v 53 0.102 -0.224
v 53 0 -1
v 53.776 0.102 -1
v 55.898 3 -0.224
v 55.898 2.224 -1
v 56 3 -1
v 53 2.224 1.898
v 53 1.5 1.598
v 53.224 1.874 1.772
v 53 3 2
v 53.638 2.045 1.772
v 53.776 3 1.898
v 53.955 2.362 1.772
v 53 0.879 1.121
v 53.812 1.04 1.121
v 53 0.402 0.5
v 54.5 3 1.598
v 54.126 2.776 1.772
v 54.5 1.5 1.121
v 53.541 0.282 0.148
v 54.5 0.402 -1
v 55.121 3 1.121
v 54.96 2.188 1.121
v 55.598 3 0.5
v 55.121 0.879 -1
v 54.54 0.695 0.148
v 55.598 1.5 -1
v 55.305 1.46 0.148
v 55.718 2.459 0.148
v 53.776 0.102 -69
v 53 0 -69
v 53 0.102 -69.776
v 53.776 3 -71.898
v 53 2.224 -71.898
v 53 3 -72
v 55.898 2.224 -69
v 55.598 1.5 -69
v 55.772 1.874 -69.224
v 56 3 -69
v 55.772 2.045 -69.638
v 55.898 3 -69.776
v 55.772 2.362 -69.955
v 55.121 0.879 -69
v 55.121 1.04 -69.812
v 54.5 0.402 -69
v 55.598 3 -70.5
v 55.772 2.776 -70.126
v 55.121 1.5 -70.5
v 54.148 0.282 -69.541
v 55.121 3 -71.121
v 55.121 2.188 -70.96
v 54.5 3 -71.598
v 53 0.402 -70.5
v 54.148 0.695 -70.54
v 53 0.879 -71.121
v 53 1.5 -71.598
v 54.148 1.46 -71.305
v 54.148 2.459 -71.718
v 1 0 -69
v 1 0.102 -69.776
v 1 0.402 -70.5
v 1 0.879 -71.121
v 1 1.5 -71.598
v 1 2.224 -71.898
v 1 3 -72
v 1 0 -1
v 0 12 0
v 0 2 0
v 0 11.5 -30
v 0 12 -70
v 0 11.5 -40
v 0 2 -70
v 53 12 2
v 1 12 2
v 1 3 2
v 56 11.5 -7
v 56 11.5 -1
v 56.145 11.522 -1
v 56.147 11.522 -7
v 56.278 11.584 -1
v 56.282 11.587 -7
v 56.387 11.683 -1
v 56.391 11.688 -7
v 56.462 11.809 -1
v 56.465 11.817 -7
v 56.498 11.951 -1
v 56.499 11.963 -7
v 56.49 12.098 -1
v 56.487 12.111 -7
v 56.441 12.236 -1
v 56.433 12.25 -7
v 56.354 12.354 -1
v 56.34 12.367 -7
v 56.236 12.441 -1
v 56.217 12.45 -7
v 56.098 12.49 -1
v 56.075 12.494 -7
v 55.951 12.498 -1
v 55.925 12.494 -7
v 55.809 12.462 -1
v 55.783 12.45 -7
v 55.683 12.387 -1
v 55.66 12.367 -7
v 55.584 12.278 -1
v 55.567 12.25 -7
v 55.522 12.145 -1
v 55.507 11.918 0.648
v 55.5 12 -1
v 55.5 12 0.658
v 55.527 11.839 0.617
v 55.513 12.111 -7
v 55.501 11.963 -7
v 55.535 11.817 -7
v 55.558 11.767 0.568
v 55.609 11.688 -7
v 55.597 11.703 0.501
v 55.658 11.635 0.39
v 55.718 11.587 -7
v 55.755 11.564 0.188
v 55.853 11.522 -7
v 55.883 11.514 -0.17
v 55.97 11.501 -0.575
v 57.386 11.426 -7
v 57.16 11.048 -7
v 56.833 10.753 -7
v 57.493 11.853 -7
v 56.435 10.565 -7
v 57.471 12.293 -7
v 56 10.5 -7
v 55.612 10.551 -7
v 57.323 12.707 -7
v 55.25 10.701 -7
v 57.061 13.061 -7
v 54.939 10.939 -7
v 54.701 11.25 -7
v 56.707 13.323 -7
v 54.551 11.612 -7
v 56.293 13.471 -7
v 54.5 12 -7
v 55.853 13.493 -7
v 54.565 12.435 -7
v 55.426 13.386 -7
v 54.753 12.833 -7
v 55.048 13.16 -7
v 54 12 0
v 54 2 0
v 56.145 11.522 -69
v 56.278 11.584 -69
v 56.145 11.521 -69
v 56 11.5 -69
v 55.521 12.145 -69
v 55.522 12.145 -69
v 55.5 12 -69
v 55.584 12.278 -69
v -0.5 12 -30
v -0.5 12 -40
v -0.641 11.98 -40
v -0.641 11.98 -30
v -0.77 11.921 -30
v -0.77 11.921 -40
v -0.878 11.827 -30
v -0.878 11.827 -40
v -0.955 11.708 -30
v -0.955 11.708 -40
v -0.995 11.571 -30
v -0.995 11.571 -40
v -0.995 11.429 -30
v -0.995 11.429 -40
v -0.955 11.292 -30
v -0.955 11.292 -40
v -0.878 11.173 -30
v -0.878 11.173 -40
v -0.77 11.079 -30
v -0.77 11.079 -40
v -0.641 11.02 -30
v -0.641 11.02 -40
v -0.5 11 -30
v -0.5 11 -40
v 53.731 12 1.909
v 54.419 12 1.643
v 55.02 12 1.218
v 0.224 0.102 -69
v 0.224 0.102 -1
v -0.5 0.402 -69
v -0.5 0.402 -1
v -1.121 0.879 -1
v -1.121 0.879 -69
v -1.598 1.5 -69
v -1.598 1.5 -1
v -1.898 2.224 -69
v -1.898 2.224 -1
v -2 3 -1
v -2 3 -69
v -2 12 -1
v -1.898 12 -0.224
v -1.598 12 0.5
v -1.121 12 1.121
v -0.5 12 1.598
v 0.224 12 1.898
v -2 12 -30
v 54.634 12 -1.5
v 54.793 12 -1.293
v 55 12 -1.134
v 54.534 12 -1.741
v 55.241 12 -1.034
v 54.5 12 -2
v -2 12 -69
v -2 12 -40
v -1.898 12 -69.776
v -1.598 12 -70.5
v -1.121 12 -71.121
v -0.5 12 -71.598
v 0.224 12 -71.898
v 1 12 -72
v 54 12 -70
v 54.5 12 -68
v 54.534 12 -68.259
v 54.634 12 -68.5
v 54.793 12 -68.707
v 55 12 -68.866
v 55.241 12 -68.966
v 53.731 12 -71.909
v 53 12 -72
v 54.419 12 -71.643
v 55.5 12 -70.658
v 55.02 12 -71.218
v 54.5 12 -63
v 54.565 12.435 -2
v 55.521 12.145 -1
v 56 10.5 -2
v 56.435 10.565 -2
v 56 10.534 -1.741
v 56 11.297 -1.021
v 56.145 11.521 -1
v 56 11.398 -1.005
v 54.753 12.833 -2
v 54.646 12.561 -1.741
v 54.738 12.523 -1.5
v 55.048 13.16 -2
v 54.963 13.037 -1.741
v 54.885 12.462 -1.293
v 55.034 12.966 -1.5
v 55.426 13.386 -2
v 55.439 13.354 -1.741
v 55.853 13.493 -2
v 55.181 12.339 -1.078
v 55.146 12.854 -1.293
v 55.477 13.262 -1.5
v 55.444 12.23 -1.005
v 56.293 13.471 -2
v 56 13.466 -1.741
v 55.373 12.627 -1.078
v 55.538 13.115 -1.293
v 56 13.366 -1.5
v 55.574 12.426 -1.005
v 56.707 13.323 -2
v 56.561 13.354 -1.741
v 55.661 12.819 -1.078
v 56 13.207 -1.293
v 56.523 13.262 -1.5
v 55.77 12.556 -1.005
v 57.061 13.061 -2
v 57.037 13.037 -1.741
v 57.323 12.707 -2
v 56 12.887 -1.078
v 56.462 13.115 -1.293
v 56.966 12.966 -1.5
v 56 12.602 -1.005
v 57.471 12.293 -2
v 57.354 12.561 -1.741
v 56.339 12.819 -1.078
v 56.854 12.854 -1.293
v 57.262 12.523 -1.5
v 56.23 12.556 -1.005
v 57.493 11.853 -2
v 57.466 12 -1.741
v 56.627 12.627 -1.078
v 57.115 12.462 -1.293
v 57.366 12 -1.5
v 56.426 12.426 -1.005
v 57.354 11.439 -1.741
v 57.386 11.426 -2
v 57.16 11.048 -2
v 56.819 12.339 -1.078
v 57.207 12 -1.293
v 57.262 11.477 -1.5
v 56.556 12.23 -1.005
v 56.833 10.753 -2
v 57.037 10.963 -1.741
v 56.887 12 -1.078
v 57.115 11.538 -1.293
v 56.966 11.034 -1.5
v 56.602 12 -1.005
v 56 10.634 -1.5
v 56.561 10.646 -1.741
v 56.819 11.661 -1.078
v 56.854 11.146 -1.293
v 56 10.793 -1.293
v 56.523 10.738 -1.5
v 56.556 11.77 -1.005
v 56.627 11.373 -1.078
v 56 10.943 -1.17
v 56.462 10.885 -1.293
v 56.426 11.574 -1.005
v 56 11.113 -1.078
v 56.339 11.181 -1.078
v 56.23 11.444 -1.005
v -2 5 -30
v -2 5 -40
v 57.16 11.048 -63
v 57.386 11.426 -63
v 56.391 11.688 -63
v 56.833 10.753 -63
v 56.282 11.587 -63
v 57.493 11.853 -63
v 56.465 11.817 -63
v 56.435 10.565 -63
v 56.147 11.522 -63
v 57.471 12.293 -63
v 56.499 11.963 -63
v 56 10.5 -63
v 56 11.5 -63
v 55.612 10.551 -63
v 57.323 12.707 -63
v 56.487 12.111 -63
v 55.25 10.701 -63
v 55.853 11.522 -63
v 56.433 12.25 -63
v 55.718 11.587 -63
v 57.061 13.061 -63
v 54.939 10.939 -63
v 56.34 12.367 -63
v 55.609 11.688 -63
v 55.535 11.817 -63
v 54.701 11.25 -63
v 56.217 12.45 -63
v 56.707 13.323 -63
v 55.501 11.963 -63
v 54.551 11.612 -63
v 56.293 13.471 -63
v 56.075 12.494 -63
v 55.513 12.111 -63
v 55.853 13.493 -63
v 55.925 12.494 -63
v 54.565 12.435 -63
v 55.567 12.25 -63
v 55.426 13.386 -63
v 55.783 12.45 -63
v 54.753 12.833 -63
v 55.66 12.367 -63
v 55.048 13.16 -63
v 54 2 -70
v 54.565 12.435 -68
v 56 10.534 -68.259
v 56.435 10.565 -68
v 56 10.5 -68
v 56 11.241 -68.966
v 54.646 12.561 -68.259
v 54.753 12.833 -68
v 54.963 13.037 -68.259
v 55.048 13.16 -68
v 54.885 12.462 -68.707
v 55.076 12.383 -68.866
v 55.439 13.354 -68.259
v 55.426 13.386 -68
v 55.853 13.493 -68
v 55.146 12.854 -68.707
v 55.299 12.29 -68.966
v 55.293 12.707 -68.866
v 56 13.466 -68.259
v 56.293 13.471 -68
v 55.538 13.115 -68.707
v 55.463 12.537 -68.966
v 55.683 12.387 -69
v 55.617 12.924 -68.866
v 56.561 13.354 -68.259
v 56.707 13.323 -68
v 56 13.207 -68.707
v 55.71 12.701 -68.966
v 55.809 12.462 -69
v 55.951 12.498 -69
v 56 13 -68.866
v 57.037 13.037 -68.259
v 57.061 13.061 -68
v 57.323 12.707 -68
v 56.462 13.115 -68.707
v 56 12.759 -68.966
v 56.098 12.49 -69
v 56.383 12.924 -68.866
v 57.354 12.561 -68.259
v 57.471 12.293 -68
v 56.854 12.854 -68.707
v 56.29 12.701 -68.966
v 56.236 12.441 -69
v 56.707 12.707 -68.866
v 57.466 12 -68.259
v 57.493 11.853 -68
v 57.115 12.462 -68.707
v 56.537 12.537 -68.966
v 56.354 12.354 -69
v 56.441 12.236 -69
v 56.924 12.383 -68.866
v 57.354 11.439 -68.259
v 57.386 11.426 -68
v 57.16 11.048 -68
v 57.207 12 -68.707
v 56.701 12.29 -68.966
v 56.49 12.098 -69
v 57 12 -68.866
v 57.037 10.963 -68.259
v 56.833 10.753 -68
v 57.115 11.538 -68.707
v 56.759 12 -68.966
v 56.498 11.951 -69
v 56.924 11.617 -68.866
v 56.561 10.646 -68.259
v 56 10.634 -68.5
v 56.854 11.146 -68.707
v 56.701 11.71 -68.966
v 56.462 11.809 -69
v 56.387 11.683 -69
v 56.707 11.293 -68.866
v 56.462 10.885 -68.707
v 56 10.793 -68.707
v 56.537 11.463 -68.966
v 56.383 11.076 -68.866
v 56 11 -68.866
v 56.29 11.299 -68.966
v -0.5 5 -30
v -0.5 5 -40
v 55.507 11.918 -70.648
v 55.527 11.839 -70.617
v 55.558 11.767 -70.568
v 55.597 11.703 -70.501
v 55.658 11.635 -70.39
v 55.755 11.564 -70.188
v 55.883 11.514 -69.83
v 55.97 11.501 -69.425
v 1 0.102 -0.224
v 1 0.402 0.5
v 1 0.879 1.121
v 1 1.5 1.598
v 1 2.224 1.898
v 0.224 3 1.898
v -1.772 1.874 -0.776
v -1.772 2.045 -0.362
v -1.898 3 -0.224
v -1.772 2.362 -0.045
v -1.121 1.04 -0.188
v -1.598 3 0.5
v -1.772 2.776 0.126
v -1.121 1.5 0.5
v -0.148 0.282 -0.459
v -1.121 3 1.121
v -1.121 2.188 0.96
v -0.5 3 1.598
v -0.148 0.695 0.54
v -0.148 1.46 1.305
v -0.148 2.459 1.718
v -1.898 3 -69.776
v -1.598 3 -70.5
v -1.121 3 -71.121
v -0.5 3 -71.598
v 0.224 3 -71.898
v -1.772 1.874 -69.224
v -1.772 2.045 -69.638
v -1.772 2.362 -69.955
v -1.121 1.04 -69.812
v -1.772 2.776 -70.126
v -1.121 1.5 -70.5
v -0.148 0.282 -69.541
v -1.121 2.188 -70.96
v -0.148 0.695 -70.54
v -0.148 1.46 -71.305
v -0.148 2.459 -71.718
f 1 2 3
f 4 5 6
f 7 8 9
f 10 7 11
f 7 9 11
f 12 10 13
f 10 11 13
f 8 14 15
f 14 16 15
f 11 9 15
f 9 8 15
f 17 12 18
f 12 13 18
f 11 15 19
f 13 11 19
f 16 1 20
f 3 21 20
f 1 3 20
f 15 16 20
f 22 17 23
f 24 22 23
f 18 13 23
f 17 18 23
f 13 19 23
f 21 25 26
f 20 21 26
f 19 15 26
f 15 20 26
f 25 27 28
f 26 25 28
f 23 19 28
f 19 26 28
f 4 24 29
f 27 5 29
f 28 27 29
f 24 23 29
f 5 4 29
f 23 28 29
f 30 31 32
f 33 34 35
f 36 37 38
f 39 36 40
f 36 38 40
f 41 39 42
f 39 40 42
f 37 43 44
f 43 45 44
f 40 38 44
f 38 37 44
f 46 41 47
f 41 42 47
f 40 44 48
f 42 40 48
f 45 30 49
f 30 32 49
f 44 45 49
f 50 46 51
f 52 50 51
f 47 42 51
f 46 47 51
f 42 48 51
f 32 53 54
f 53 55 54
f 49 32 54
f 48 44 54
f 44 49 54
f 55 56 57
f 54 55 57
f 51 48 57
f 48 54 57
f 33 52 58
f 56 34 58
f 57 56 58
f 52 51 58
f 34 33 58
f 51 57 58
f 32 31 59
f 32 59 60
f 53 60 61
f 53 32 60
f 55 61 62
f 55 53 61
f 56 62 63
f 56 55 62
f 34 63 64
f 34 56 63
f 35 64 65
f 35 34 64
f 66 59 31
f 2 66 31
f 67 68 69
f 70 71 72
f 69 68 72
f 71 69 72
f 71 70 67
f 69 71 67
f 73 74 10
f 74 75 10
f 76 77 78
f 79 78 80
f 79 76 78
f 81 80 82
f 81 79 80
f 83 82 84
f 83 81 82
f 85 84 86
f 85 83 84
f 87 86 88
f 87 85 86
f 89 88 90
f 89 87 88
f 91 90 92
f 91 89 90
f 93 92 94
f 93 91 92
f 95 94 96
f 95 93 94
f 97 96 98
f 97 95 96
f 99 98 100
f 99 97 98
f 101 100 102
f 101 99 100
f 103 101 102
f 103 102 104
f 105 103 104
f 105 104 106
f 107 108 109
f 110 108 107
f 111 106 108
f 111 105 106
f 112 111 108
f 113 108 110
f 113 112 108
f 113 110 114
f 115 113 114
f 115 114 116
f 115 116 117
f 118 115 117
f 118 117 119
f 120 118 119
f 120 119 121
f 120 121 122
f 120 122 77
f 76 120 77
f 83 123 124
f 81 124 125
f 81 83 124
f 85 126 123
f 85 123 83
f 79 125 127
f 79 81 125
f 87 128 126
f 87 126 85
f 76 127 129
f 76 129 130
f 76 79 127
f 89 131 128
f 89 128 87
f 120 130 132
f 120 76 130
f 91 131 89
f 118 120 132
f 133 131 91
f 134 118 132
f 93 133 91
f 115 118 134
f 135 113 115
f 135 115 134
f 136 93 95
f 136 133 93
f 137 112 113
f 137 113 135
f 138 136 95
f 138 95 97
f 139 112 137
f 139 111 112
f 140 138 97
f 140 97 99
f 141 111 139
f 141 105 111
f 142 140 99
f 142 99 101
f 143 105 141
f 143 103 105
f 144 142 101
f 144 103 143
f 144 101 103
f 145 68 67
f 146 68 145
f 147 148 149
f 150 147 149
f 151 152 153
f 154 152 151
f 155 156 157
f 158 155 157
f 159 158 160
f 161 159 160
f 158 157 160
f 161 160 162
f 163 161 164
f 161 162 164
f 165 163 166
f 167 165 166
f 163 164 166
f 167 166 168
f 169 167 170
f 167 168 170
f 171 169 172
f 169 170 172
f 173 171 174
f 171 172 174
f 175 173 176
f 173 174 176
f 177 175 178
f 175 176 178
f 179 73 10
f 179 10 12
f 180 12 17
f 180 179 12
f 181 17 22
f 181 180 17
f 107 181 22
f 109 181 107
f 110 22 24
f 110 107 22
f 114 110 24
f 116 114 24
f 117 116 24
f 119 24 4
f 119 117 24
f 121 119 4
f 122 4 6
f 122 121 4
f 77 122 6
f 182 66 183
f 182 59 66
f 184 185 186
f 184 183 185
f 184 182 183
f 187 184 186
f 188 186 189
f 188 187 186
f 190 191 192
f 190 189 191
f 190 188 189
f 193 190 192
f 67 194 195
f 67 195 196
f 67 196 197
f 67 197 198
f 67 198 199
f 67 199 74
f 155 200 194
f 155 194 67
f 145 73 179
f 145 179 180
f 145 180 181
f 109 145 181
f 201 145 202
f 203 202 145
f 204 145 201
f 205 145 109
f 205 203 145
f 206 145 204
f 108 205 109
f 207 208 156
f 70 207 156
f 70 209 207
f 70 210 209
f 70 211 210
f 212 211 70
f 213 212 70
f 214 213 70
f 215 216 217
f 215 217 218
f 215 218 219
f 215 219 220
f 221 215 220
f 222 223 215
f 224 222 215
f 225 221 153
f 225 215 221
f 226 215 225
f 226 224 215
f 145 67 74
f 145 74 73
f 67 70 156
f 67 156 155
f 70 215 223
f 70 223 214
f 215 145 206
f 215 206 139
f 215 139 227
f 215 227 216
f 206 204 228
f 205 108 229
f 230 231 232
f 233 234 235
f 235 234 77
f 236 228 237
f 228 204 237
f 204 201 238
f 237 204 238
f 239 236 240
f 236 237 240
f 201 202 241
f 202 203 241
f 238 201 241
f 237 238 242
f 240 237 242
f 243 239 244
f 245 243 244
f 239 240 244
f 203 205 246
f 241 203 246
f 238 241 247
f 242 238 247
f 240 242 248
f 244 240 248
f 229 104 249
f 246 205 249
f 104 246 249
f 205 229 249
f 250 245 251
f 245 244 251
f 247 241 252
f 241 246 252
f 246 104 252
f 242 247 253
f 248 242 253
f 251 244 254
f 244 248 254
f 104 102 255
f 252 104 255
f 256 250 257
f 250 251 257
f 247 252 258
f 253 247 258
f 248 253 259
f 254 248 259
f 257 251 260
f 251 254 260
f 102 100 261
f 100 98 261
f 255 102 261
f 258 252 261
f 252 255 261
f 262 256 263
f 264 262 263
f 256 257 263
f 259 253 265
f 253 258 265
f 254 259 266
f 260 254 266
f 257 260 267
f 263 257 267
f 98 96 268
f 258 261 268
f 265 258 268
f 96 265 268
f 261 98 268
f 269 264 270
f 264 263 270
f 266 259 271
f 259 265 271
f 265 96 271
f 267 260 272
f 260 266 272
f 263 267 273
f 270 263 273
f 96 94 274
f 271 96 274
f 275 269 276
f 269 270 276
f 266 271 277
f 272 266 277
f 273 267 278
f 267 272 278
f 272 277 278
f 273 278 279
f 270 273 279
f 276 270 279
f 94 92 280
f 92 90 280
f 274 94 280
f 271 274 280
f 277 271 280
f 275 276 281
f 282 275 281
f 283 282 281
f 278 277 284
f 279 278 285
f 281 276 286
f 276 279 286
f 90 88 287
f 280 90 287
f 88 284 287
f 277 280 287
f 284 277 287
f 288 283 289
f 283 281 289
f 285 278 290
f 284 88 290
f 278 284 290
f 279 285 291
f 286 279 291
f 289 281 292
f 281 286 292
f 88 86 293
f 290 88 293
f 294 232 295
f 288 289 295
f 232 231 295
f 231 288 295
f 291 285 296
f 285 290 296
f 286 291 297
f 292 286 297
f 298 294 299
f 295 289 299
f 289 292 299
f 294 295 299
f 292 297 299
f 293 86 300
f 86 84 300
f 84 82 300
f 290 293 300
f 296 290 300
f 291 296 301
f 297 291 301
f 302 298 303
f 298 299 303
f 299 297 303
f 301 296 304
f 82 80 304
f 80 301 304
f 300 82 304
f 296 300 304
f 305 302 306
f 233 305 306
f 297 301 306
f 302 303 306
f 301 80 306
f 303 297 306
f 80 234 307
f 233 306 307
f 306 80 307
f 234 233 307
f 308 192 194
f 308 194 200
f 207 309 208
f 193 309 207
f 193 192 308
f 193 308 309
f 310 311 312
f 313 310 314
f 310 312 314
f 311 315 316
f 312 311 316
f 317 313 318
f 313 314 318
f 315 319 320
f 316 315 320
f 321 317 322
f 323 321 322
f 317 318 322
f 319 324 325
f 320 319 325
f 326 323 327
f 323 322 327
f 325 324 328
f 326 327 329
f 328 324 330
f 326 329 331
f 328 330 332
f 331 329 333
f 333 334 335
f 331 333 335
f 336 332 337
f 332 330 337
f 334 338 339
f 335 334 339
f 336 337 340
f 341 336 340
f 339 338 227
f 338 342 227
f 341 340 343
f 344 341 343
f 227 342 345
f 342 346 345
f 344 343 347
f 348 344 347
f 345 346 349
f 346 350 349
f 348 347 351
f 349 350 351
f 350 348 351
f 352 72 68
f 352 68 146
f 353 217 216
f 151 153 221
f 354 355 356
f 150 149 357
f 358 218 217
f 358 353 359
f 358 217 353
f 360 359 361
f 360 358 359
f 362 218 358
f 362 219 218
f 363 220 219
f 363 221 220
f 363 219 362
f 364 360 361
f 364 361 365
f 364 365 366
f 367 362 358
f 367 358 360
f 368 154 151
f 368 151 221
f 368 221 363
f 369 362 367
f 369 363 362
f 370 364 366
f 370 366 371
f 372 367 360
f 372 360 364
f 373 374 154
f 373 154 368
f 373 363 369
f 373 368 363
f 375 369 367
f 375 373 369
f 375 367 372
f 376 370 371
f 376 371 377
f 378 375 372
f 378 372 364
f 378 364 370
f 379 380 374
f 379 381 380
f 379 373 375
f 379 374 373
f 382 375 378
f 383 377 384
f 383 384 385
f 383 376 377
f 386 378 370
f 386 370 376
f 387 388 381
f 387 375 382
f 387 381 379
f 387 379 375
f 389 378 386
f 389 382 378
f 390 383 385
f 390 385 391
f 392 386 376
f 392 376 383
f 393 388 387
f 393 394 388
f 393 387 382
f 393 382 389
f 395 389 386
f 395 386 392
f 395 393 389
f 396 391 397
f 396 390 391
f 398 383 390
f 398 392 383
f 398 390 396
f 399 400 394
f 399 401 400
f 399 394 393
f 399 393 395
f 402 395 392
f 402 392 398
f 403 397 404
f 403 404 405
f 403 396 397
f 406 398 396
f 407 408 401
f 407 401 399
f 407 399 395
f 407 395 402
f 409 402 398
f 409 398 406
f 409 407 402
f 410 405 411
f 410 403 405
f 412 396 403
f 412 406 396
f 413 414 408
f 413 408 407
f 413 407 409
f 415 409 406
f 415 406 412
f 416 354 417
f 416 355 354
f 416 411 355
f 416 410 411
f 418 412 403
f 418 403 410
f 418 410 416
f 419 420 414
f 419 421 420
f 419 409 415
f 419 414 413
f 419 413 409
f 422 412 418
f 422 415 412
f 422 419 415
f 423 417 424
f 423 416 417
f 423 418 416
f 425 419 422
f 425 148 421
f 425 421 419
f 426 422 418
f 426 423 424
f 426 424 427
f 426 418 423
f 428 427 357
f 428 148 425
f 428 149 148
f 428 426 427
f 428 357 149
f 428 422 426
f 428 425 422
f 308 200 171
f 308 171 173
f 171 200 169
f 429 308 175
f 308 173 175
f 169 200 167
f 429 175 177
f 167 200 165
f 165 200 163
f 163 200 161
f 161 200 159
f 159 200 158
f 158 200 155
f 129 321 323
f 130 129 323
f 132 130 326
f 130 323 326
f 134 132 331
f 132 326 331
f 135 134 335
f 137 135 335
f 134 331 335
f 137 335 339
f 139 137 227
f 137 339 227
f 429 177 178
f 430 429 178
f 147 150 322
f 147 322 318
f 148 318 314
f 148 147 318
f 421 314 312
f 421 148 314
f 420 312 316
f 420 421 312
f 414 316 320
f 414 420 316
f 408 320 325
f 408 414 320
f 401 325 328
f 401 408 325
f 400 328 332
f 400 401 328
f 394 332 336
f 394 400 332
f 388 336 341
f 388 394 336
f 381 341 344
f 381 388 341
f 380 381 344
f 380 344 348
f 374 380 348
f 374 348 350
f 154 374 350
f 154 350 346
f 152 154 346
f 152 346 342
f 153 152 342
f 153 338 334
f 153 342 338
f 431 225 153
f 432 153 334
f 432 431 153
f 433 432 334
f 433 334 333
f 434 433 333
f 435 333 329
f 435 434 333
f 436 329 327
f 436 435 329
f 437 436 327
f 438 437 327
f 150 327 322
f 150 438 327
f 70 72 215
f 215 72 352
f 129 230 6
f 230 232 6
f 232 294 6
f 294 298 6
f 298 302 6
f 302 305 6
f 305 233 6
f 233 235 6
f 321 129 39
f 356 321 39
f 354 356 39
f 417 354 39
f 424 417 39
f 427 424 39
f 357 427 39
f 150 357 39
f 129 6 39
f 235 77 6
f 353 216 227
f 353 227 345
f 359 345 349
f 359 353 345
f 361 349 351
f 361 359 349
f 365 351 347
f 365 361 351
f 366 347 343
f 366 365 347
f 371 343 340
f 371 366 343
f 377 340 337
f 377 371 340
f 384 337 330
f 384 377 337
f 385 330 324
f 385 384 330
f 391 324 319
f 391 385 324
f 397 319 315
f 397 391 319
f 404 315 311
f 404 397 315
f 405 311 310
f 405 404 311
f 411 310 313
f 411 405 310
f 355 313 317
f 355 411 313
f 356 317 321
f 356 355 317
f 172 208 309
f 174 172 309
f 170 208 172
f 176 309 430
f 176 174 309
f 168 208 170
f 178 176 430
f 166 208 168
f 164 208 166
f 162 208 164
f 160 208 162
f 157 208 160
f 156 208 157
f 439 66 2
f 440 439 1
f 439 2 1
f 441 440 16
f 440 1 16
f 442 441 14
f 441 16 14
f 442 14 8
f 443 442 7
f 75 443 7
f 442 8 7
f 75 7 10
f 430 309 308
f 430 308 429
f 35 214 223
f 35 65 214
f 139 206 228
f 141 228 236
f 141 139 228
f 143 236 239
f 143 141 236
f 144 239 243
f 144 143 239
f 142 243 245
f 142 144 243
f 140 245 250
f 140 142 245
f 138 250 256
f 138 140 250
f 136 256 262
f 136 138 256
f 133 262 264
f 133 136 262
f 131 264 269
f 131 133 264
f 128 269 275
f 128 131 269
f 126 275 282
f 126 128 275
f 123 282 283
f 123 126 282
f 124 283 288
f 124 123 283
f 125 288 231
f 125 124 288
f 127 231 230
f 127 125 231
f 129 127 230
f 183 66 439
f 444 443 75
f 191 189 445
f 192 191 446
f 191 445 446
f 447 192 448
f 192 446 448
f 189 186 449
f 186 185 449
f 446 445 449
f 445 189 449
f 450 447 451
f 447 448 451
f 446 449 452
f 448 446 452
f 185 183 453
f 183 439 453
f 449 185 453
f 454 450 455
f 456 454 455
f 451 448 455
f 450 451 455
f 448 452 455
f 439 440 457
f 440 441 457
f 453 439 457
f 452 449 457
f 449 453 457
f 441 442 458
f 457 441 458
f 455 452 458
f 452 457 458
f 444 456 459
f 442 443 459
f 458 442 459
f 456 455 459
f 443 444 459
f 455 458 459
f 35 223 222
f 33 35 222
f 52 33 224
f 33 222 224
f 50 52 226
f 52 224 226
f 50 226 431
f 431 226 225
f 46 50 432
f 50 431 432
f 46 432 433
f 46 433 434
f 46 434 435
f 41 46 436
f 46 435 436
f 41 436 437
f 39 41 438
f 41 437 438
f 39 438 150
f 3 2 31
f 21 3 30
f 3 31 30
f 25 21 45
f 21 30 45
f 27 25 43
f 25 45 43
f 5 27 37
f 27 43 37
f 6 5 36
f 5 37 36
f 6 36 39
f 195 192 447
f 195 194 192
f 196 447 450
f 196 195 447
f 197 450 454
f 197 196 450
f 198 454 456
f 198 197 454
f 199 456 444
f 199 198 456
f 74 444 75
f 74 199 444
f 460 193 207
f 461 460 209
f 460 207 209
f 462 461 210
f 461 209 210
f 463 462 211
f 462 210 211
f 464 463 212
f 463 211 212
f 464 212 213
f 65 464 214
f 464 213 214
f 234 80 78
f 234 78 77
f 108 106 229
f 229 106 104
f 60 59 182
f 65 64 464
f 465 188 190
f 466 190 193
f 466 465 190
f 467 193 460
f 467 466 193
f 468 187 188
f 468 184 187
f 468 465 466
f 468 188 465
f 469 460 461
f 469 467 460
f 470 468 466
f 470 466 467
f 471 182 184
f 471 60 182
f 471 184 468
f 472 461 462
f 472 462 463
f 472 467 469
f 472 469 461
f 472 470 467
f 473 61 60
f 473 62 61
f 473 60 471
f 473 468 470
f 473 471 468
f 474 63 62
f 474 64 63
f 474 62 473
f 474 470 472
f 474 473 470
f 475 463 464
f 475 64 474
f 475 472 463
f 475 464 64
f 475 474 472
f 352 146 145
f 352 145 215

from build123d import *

# Parameters (mm, degrees)
BOTTOM_W                 = 58
BOTTOM_H                 = 74
BOTTOM_W_2               = 54
BOTTOM_H_2               = 70
DUVAR_DEPTH              = 12
BOTTOM_2_W               = 54
BOTTOM_2_H               = 70
TABAN_DEPTH              = 2
FILLET2_R                = 3
MENTESE_OUT_R            = 1.5
MENTESE_DEPTH            = 68
MENTESE_DELIK_DEPTH      = 93.355292214
MENTESE_DELIK_DEPTH_BACK = 93.355292214
MENTESE_IN_R             = 0.5
MENTESE_FILLET_R         = 1
MENTESE_OUT_CUT_R        = 1.5
MENTESE_BOSLUK_DEPTH     = 56
CENTIK_W                 = 1.5
CENTIK_H                 = 10
CENTIK_BOSLUK_DEPTH      = 7
DIL_R                    = 0.5
BOSS_EXTRUDE5_DEPTH      = 10


with BuildPart() as part:
    # bottom → duvar (new body)
    with BuildSketch(Plane(origin=(0, 0, 0), x_dir=(1, 0, 0), z_dir=(0, 1, 0))):
        with Locations((27, 35)):
            Rectangle(BOTTOM_W, BOTTOM_H)
        with Locations((27, 35)):
            Rectangle(BOTTOM_W_2, BOTTOM_H_2, mode=Mode.SUBTRACT)
    extrude(amount=DUVAR_DEPTH)

    # bottom<2> → taban (add)
    with BuildSketch(Plane(origin=(0, 0, 0), x_dir=(1, 0, 0), z_dir=(0, 1, 0))):
        with Locations((27, 35)):
            Rectangle(BOTTOM_2_W, BOTTOM_2_H)
    extrude(amount=TABAN_DEPTH)

    # Fillet2
    fillet2_edges = [part.edges().sort_by_distance(p)[0] for p in [
        (27, 0, -72),
        (56, 0, -35),
        (27, 0, 2),
        (-2, 0, -35),
        (-2, 6, -72),
        (56, 6, -72),
        (56, 6, 2),
        (-2, 6, 2),
    ]]
    fillet(fillet2_edges, radius=FILLET2_R)

    # mentese out → mentese (add)
    with BuildSketch(Plane(origin=(0, 0, -69), x_dir=(-1, 0, 0), z_dir=(0, 0, -1))):
        with Locations((-56, 12)):
            Circle(MENTESE_OUT_R)
    extrude(amount=-MENTESE_DEPTH)

    # mentese in → mentese delik (cut, two sides: drawn at the far end of the back side and taken through both)
    with BuildSketch(Plane.XY.offset(-1).offset(-MENTESE_DELIK_DEPTH_BACK)):
        with Locations(Location((56, 12, 0), (0, 0, 270))):
            Circle(MENTESE_IN_R)
    extrude(amount=MENTESE_DELIK_DEPTH + MENTESE_DELIK_DEPTH_BACK, mode=Mode.SUBTRACT)

    # mentese fillet
    mentese_fillet_edges = [part.edges().sort_by_distance(p)[0] for p in [
        (57.060660172, 13.060660172, -69),
        (57.060660172, 13.060660172, -1),
    ]]
    fillet(mentese_fillet_edges, radius=MENTESE_FILLET_R - 0.0001)  # a hair under: the kernel refuses the full size

    # mentese out cut → mentese bosluk (cut)
    with BuildSketch(Plane(origin=(0, 0, -63), x_dir=(-1, 0, 0), z_dir=(0, 0, -1))):
        with Locations((-56, 12)):
            Circle(MENTESE_OUT_CUT_R)
    extrude(amount=-MENTESE_BOSLUK_DEPTH, mode=Mode.SUBTRACT)

    # centik → centik bosluk (cut)
    with BuildSketch(Plane(origin=(0, 12, 0), x_dir=(1, 0, 0), z_dir=(0, 1, 0))):
        with Locations((-1.25, 35)):
            Rectangle(CENTIK_W, CENTIK_H)
    extrude(amount=-CENTIK_BOSLUK_DEPTH, mode=Mode.SUBTRACT)

    # dil → Boss-Extrude5 (add)
    with BuildSketch(Plane.XY.offset(-40)):
        with Locations((-0.5, 11.5)):
            Circle(DIL_R)
    extrude(amount=BOSS_EXTRUDE5_DEPTH)


solid = part.part
